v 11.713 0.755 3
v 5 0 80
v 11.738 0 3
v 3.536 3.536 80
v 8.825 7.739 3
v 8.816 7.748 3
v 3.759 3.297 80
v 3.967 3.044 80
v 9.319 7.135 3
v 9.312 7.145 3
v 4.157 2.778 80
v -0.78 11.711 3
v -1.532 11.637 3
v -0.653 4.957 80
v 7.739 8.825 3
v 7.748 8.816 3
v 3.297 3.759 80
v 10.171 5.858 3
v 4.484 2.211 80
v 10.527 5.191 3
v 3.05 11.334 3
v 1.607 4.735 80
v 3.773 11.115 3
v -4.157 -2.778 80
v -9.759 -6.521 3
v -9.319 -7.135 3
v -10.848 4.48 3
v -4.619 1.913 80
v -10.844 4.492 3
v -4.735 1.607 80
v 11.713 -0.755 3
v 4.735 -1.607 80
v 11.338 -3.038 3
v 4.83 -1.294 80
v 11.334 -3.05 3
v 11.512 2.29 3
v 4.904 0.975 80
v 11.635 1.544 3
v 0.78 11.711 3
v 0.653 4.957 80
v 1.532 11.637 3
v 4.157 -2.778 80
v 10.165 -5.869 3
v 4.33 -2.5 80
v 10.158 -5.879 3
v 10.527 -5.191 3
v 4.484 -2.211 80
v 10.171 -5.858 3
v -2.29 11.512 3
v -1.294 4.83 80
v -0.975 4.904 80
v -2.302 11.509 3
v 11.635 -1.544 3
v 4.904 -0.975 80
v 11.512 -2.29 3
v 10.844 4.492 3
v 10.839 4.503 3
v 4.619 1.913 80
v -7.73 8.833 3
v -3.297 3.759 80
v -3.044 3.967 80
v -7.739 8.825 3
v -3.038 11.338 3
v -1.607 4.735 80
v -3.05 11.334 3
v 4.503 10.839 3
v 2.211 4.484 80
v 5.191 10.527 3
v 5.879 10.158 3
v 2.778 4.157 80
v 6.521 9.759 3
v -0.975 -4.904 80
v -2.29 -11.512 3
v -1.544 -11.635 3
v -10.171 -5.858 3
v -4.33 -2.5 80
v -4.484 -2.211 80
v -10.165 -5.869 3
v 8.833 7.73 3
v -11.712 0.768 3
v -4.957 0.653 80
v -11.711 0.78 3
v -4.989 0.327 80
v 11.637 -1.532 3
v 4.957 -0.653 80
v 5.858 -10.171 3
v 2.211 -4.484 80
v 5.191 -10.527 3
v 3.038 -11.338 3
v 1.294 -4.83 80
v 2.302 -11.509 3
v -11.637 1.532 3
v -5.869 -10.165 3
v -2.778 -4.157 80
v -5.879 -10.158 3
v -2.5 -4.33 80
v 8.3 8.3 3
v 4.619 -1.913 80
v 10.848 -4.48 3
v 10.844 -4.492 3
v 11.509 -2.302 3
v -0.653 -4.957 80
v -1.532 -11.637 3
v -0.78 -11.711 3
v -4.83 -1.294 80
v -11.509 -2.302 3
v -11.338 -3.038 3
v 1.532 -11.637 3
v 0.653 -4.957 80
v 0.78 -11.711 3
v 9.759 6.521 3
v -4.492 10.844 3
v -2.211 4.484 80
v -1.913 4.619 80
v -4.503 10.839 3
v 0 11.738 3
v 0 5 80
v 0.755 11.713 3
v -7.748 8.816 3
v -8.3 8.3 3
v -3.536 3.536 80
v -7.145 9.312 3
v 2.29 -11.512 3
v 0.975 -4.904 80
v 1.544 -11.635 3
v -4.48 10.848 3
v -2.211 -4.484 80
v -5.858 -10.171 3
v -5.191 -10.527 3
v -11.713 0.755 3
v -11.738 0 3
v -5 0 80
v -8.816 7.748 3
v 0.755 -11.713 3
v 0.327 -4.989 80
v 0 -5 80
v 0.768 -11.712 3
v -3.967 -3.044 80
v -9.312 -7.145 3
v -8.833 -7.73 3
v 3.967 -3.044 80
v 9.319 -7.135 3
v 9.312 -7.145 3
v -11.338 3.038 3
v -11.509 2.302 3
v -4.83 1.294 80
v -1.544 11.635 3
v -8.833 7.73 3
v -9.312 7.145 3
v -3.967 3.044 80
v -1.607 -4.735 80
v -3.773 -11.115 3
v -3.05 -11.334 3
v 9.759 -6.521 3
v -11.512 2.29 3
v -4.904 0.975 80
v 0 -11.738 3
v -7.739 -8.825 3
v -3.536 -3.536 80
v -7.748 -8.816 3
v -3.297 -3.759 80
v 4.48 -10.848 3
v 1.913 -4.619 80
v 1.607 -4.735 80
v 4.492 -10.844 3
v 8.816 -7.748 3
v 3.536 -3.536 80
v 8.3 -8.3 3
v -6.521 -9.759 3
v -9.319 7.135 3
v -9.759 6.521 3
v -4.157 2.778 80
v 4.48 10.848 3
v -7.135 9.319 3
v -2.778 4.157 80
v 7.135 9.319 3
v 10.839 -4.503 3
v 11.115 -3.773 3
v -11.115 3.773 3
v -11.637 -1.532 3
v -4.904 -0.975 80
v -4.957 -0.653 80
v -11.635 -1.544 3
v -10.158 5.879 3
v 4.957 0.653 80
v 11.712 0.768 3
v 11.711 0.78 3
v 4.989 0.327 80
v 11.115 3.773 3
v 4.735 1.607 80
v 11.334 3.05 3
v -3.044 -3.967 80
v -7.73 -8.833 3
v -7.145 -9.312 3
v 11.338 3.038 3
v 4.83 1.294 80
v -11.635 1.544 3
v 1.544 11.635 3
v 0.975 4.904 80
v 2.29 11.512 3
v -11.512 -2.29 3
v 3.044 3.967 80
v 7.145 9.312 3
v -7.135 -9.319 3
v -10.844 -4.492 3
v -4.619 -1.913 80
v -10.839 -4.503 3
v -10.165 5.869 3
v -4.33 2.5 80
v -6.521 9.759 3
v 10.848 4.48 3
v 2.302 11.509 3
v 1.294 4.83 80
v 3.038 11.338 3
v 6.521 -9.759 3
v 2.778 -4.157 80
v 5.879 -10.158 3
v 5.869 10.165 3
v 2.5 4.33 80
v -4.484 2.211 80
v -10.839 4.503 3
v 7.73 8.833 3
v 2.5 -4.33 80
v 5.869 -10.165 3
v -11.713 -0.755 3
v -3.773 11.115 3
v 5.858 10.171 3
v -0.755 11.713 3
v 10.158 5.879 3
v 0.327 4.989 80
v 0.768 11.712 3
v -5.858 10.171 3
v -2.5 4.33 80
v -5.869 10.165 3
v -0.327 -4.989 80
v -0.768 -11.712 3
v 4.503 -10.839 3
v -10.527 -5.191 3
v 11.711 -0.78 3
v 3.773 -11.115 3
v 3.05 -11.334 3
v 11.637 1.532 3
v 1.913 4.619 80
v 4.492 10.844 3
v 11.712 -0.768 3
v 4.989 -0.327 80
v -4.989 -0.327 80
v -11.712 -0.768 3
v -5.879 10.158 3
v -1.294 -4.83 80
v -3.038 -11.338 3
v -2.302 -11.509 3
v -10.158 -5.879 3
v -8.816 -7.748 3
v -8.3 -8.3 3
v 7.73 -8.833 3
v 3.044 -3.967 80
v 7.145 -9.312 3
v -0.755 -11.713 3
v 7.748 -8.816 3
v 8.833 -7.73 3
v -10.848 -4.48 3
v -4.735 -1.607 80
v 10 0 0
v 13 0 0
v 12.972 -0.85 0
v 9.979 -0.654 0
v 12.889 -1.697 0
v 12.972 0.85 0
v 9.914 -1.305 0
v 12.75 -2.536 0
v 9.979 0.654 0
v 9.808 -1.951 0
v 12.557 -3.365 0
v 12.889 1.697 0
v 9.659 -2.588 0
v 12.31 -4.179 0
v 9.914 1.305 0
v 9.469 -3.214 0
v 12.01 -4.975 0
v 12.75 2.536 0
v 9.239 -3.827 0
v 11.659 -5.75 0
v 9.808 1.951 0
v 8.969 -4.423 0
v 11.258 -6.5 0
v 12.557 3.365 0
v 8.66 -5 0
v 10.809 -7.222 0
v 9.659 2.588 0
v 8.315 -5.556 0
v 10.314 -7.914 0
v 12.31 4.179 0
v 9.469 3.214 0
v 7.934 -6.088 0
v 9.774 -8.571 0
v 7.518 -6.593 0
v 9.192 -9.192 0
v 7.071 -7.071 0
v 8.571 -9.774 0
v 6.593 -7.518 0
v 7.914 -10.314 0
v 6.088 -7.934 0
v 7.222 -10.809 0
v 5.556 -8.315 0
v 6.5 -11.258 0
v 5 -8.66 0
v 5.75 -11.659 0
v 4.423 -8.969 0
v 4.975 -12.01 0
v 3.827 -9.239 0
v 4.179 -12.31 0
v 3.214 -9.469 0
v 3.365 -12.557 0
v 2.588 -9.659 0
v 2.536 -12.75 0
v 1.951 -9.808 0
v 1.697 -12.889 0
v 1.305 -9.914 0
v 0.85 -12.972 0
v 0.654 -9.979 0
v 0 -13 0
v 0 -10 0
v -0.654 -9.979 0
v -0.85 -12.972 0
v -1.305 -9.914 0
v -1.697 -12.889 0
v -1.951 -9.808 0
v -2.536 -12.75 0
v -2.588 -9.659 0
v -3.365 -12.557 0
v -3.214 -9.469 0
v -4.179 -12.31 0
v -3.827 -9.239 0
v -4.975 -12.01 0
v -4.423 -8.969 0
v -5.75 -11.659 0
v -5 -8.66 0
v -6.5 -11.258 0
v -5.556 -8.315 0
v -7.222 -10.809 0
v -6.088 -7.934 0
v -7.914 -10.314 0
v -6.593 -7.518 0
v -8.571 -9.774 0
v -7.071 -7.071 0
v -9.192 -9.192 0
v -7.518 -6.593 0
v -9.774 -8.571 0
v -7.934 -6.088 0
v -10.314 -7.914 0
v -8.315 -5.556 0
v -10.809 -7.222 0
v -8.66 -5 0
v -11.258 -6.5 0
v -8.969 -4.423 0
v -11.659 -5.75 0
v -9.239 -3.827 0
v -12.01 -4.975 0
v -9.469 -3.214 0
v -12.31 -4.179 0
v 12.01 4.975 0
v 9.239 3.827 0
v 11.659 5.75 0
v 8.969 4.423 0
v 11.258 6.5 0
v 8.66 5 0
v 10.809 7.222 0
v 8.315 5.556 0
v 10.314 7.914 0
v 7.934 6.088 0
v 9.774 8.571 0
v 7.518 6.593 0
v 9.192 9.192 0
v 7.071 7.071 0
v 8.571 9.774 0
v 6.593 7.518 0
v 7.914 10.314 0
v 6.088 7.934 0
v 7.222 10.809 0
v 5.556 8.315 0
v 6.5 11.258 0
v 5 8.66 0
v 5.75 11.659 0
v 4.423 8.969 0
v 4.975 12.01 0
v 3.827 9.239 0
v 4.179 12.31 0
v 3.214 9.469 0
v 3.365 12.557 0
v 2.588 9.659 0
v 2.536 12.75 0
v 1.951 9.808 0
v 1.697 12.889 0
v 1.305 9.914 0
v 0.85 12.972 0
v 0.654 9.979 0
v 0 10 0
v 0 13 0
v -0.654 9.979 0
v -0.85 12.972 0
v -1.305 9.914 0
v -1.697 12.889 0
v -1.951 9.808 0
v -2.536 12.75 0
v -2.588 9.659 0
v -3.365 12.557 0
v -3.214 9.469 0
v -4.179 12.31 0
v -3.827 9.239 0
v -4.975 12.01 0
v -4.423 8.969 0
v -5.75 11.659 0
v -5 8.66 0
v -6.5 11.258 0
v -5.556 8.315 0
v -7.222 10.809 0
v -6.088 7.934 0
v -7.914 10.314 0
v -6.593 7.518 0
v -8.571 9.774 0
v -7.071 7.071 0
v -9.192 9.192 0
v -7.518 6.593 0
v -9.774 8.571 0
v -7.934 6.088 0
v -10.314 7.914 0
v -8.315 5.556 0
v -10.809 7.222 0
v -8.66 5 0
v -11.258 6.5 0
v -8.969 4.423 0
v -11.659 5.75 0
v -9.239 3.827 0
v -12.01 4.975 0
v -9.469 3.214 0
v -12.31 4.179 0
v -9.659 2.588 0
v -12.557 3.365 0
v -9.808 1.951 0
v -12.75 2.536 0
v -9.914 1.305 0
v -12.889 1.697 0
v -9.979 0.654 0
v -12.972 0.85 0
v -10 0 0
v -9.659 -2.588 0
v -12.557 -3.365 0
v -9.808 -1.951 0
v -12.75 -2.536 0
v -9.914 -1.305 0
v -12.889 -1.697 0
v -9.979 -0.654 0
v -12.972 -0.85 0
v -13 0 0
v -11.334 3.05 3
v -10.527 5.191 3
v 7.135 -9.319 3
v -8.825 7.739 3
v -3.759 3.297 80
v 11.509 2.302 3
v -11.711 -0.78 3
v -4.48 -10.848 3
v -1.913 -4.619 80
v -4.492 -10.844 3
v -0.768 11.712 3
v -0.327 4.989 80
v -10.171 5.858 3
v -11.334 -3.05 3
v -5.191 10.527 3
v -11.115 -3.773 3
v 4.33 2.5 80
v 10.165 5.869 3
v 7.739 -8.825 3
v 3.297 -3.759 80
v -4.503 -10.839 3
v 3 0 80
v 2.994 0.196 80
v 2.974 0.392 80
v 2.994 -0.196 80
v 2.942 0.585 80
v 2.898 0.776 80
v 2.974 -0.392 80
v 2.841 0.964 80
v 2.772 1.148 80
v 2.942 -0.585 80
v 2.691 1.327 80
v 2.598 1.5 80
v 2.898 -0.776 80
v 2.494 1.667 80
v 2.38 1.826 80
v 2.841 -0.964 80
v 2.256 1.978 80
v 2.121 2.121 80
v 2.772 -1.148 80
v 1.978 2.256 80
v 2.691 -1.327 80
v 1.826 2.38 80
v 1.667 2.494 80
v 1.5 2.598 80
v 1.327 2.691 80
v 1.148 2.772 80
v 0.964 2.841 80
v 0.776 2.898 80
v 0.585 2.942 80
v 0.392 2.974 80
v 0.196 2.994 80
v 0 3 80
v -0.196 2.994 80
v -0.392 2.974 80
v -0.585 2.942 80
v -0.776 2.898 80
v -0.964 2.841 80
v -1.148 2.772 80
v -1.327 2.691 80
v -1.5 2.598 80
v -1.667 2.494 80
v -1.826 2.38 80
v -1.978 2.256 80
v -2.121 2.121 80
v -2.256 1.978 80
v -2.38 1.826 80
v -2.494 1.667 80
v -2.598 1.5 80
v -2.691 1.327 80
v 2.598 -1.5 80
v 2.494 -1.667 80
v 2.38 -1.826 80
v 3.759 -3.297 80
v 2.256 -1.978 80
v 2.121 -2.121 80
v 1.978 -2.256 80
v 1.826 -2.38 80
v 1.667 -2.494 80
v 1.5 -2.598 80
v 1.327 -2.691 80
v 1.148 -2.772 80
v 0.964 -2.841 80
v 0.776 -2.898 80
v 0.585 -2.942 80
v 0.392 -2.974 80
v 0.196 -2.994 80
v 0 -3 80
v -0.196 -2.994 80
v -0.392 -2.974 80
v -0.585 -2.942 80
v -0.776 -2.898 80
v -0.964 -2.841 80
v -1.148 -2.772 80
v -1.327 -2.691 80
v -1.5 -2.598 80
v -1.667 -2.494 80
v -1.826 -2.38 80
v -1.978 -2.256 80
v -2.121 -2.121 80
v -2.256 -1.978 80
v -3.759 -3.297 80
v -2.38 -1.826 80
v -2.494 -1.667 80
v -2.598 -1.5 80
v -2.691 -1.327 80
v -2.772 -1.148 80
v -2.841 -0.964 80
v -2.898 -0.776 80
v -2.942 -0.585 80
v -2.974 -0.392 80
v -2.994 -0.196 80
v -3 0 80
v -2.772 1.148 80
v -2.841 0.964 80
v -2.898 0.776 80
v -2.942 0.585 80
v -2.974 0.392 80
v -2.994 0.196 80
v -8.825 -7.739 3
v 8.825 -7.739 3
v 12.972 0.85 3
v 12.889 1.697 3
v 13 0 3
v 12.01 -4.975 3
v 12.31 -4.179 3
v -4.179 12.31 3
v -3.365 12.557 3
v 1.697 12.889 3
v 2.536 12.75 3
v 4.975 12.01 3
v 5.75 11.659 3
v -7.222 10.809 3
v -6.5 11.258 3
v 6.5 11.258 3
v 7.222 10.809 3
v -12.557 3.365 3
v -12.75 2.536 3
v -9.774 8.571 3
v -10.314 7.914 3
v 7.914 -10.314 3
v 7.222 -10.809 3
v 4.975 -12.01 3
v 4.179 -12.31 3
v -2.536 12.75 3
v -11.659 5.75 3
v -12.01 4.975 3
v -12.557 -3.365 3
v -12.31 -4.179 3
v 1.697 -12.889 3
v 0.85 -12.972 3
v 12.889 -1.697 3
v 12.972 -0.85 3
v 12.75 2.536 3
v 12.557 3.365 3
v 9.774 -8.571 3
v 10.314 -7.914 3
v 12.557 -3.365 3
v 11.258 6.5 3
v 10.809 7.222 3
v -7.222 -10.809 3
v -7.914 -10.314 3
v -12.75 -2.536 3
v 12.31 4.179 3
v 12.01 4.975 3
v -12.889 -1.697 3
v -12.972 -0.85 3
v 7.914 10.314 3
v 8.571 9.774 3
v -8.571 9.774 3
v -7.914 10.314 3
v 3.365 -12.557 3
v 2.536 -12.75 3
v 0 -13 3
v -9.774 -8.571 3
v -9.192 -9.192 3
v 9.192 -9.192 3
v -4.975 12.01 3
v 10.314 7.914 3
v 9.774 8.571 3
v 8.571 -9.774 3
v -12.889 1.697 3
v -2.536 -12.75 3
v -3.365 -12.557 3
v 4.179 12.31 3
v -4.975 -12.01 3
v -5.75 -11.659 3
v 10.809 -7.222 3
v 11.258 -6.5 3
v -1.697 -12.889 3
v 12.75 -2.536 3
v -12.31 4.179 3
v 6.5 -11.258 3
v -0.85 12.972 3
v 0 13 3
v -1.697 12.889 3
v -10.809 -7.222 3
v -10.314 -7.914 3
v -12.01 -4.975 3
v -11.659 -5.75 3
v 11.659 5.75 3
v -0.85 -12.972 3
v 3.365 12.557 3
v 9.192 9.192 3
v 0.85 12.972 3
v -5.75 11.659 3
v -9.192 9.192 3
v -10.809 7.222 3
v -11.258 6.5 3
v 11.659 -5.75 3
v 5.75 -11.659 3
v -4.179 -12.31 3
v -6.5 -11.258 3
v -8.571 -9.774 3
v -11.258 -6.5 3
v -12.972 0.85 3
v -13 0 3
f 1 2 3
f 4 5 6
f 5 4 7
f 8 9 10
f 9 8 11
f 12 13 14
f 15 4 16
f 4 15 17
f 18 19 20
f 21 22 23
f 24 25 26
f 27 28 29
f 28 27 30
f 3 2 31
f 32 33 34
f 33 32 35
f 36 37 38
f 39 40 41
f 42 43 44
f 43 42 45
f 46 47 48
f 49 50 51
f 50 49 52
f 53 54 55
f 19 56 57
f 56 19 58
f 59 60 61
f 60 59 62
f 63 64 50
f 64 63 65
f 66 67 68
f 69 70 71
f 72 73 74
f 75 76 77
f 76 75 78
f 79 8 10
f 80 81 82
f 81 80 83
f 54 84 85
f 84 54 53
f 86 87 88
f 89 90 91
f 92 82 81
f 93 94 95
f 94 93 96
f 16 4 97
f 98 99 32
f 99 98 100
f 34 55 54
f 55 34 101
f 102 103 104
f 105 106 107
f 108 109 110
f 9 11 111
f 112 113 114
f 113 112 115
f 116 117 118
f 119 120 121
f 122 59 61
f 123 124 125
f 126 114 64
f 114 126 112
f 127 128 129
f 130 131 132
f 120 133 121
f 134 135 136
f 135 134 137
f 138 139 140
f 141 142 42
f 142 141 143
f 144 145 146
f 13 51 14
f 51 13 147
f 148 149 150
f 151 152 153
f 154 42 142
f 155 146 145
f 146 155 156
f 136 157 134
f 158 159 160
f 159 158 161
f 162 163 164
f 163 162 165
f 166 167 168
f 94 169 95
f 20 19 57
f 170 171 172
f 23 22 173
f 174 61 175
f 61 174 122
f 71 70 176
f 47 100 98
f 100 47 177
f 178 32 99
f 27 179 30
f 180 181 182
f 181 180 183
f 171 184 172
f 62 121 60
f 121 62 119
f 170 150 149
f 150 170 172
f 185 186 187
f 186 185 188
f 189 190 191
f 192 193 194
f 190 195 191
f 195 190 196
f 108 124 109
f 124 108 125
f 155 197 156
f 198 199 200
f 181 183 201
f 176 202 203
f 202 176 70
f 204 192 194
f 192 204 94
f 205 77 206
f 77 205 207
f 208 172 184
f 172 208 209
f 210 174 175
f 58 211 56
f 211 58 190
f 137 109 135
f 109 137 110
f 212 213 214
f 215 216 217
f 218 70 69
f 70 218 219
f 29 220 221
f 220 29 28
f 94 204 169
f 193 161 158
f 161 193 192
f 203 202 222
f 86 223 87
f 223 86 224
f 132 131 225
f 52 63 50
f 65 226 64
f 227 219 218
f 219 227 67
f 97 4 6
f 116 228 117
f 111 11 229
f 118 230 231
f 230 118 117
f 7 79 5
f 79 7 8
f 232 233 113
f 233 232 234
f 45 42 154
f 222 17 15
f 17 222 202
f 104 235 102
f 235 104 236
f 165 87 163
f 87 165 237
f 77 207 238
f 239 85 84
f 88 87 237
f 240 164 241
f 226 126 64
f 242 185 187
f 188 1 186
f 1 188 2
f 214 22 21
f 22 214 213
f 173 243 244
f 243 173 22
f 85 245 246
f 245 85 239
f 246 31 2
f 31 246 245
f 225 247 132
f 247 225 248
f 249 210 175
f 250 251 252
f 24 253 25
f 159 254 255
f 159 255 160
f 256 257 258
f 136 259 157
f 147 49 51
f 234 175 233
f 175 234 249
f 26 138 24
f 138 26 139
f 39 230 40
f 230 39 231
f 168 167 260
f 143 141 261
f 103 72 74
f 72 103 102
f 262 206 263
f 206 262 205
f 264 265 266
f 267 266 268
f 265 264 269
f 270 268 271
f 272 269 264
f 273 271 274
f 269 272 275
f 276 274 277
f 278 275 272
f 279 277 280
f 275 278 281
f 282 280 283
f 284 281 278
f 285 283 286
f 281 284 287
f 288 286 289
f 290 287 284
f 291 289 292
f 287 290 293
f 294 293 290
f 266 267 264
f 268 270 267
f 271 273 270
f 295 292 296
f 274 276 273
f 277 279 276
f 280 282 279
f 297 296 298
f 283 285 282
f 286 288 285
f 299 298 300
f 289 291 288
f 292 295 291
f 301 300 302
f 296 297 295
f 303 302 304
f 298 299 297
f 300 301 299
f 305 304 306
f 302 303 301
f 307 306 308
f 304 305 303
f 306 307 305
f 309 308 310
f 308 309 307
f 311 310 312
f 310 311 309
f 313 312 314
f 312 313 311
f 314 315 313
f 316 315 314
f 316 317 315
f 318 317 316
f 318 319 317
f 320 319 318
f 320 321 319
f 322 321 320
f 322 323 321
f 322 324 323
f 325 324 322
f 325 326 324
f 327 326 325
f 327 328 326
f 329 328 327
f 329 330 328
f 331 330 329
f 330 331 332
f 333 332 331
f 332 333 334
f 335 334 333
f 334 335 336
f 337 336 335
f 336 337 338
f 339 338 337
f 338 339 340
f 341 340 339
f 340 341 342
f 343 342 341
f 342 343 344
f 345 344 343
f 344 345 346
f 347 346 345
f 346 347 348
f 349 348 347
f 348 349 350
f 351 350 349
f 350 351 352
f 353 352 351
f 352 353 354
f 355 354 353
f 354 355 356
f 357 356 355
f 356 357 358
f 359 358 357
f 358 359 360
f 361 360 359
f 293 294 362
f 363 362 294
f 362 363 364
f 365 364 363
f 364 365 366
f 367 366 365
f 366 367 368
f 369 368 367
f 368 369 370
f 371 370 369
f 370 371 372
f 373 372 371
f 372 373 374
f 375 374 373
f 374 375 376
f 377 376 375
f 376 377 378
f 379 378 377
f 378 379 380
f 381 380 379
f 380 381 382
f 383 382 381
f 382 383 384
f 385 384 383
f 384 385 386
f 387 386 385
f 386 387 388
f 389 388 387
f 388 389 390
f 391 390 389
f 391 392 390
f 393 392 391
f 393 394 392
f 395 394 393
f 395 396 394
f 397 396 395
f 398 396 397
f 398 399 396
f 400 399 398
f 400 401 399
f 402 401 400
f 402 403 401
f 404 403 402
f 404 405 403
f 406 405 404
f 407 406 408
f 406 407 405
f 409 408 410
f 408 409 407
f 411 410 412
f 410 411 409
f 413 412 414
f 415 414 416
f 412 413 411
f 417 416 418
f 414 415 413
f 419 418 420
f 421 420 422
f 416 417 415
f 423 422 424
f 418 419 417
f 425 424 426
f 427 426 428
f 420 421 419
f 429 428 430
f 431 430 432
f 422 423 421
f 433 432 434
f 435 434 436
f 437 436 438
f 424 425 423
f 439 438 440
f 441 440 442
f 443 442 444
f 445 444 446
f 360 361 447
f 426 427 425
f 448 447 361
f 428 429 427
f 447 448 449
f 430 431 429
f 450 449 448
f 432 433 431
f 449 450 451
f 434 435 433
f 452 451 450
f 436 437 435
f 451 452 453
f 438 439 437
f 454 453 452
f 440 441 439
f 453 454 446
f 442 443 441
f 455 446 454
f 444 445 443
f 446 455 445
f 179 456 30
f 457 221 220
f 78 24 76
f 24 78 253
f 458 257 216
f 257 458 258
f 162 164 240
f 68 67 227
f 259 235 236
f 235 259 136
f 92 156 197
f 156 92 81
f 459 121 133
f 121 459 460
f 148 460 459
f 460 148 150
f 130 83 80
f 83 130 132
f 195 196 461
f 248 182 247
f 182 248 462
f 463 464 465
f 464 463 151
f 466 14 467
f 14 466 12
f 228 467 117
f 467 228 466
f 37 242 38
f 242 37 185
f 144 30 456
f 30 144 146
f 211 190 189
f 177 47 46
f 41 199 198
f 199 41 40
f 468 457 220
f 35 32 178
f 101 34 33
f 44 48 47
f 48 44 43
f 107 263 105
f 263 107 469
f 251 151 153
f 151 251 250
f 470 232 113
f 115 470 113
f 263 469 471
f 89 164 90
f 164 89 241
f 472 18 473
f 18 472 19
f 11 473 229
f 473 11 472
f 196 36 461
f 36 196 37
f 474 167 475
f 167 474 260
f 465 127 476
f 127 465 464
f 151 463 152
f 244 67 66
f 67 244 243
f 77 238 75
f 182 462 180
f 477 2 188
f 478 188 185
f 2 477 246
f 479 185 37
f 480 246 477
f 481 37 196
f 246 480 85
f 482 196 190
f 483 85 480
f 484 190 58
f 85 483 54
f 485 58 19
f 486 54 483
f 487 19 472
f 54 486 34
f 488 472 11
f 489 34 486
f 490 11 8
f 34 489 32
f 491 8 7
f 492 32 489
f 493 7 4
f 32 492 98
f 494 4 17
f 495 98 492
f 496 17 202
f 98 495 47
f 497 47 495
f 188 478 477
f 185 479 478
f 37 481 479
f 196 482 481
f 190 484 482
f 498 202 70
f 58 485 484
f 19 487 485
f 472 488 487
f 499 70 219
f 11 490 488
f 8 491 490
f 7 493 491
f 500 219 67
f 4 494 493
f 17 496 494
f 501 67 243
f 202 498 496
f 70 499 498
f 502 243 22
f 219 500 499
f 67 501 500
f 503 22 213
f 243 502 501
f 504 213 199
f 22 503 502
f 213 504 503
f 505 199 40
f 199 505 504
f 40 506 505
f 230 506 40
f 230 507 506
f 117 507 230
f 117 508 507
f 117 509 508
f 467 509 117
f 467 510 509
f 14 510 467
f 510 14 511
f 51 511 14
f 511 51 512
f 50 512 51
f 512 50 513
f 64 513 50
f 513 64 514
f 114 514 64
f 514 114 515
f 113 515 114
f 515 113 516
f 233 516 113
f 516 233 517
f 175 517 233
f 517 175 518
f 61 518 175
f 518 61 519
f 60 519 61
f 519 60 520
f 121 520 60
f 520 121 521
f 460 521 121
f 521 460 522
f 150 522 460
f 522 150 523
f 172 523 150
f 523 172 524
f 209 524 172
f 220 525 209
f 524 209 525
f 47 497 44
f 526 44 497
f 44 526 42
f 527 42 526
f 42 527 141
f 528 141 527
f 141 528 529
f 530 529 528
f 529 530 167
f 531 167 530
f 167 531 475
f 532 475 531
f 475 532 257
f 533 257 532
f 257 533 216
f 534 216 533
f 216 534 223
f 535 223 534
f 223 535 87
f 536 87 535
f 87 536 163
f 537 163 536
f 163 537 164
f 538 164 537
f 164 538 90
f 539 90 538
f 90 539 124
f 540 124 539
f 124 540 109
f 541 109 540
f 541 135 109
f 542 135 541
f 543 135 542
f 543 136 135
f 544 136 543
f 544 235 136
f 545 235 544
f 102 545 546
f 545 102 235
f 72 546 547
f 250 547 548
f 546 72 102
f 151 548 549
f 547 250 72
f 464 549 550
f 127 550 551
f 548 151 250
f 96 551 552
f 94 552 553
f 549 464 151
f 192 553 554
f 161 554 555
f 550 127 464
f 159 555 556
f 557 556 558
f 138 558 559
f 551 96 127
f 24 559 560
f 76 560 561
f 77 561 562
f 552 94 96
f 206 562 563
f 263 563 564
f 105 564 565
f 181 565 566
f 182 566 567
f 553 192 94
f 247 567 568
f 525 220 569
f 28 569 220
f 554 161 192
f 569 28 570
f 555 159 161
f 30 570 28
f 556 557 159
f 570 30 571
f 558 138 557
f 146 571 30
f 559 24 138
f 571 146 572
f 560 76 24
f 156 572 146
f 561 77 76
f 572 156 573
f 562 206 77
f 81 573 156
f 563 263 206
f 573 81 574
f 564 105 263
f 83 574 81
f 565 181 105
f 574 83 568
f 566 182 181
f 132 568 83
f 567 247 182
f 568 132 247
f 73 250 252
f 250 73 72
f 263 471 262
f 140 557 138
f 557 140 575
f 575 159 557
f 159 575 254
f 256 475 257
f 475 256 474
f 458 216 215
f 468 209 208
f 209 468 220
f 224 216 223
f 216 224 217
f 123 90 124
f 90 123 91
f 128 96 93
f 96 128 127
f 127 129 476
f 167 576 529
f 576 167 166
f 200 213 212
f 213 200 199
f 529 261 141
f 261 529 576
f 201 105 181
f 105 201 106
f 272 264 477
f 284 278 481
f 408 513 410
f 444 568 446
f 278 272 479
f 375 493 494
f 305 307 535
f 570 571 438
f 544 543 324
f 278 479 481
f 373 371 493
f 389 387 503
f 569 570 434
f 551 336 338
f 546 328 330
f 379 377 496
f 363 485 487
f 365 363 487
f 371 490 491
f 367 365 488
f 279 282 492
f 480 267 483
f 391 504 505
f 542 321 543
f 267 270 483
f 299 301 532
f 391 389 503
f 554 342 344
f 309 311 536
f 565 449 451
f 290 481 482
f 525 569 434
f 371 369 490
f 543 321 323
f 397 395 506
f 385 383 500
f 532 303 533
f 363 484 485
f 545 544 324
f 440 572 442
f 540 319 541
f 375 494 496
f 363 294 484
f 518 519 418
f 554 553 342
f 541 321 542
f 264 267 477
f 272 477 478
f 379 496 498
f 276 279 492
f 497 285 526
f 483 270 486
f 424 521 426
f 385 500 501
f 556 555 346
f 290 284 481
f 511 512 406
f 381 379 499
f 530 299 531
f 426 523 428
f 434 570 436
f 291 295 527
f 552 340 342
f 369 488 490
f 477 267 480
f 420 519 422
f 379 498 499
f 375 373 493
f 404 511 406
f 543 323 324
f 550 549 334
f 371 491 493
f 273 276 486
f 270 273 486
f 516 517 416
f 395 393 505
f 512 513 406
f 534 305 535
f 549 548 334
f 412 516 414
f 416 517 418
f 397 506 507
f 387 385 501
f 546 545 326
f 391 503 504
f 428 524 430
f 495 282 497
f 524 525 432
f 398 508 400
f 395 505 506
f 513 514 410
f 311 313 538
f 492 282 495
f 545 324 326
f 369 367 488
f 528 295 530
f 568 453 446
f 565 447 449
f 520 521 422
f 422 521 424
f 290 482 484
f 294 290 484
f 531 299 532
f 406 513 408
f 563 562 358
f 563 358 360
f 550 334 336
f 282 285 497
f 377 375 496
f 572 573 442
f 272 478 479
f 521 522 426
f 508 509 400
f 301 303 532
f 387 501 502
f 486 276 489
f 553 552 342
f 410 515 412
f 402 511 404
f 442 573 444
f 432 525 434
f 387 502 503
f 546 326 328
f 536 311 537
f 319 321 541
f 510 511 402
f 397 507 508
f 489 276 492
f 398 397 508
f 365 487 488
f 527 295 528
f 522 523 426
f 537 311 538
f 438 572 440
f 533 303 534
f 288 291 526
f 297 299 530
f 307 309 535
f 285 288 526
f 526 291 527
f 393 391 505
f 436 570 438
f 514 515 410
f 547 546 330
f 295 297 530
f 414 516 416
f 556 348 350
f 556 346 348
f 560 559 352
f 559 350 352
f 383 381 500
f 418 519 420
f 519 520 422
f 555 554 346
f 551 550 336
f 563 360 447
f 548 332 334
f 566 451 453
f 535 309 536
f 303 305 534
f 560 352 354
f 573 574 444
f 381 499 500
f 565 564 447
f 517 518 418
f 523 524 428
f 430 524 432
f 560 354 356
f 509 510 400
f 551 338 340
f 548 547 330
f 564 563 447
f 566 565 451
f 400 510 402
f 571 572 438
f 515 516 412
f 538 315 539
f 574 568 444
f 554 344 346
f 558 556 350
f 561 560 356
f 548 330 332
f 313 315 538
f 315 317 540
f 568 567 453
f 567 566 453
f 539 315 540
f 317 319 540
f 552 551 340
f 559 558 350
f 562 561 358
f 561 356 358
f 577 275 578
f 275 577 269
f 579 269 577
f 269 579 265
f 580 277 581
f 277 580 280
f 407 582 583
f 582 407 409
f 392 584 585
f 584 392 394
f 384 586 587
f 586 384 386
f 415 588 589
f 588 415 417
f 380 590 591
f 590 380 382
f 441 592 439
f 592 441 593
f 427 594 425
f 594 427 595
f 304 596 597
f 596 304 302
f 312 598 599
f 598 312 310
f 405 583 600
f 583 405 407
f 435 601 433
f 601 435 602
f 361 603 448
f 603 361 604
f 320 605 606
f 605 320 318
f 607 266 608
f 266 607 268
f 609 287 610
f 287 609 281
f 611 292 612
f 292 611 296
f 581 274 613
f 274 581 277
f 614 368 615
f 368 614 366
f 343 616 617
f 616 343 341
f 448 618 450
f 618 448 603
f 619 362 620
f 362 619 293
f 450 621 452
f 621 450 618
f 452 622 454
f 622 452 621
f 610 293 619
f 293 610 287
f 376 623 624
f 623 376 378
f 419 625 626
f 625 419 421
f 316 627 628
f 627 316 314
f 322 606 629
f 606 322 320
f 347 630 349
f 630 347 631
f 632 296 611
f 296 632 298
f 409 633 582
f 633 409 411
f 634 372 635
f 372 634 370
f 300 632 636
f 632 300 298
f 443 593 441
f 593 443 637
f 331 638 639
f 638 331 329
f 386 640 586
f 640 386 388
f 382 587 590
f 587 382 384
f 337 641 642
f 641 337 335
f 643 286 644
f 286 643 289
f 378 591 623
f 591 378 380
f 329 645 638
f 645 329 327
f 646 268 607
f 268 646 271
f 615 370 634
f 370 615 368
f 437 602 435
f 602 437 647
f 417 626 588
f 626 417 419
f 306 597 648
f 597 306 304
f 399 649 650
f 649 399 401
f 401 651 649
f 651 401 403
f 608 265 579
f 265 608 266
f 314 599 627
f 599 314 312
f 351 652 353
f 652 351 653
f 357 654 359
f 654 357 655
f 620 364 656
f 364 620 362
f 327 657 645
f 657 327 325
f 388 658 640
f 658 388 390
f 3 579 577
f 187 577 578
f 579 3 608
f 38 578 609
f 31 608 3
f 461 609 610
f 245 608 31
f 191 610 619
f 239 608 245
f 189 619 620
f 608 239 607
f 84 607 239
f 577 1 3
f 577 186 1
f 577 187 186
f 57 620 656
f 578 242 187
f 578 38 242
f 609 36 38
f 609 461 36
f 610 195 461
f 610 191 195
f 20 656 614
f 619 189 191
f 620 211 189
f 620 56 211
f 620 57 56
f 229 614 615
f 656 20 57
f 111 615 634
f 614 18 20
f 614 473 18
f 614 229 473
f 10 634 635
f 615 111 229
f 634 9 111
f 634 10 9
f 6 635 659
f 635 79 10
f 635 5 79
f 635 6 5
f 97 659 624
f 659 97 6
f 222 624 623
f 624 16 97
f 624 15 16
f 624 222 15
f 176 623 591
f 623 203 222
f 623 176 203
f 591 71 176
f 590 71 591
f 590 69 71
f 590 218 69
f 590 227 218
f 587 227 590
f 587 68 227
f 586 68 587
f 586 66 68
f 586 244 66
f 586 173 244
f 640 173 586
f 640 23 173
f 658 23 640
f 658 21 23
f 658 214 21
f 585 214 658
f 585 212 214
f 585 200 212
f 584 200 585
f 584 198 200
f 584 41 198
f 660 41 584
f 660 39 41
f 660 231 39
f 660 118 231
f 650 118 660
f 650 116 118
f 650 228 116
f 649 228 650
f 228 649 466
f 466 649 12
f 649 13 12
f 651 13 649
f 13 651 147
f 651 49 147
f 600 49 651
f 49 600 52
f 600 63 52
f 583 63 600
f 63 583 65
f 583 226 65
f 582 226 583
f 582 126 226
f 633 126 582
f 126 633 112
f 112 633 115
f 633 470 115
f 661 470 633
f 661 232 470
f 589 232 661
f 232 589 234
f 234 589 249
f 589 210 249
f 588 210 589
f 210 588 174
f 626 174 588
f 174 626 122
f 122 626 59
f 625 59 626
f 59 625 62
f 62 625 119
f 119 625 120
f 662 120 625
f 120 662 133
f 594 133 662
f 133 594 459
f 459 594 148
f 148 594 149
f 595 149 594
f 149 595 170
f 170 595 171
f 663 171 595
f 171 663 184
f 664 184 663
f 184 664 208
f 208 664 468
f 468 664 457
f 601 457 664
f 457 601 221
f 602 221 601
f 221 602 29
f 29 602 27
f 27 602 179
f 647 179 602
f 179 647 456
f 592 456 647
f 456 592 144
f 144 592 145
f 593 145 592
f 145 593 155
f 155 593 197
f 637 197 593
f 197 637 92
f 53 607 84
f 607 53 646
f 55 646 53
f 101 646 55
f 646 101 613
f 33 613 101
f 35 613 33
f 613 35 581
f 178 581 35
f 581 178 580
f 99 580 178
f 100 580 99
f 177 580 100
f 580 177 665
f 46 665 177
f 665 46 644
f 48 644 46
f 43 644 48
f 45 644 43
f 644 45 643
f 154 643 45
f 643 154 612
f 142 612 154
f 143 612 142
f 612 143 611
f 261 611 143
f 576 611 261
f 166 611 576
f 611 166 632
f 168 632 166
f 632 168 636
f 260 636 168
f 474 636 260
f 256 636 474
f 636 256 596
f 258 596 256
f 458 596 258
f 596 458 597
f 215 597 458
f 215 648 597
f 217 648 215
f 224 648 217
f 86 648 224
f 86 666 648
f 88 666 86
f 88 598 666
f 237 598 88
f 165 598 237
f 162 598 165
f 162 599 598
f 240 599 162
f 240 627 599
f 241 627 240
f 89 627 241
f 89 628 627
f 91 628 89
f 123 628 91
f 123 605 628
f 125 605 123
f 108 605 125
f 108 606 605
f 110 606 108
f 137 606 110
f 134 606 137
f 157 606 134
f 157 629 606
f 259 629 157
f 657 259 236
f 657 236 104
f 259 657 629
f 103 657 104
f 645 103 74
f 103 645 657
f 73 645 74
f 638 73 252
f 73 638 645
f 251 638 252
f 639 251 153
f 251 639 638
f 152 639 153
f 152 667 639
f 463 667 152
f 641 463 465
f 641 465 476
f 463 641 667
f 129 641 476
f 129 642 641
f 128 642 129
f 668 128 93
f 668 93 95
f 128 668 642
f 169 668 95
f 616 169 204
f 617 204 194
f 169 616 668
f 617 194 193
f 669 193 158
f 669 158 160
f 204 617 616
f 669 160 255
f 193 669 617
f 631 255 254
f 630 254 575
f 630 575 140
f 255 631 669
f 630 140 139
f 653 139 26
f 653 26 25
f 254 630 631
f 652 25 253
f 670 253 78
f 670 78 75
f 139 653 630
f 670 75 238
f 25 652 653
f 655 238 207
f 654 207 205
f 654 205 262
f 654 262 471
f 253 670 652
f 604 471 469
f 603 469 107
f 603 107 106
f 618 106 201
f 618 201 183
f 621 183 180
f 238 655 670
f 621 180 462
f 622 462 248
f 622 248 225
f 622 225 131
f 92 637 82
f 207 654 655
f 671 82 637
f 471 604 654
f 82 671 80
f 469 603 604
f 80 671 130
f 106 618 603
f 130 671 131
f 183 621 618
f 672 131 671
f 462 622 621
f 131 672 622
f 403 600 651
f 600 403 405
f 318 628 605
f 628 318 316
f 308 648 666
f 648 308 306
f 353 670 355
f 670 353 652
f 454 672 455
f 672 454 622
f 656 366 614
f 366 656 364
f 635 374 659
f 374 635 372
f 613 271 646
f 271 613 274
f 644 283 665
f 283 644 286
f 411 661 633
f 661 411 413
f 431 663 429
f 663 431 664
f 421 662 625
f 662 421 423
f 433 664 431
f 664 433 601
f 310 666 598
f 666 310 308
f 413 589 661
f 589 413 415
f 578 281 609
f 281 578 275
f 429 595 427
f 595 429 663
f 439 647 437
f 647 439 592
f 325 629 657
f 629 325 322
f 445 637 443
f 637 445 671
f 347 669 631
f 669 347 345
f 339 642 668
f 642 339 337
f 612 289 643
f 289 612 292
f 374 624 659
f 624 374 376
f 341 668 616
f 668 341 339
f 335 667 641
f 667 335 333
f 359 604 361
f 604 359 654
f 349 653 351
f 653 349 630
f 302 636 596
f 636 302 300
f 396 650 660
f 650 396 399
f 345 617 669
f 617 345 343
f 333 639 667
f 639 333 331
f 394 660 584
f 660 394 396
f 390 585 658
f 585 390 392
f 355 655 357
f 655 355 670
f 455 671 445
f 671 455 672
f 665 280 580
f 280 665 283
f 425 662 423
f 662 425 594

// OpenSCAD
// Parametric breath funnel for smartphone mic
// Adjust dimensions to fit phone case mic position and disposable filter

inner_diameter = 20; // mm, mouth end opening
exit_diameter = 6;   // mm, phone-side opening
length = 80;         // mm, funnel length
wall = 2;            // mm, wall thickness
lip = 3;             // mm, outer lip for filter retention

module funnel() {
	// Outer cone
	difference() {
		cylinder(h=length, r1=inner_diameter/2 + wall, r2=exit_diameter/2 + wall, $fn=96);
		translate([0,0,0]) cylinder(h=length, r1=inner_diameter/2, r2=exit_diameter/2, $fn=96);
	}
	// Lip at mouth end
	translate([0,0,0]) difference() {
		cylinder(h=lip, r=inner_diameter/2 + wall + 1, $fn=96);
		cylinder(h=lip, r=inner_diameter/2 + 0.5, $fn=96);
	}
}

funnel();
